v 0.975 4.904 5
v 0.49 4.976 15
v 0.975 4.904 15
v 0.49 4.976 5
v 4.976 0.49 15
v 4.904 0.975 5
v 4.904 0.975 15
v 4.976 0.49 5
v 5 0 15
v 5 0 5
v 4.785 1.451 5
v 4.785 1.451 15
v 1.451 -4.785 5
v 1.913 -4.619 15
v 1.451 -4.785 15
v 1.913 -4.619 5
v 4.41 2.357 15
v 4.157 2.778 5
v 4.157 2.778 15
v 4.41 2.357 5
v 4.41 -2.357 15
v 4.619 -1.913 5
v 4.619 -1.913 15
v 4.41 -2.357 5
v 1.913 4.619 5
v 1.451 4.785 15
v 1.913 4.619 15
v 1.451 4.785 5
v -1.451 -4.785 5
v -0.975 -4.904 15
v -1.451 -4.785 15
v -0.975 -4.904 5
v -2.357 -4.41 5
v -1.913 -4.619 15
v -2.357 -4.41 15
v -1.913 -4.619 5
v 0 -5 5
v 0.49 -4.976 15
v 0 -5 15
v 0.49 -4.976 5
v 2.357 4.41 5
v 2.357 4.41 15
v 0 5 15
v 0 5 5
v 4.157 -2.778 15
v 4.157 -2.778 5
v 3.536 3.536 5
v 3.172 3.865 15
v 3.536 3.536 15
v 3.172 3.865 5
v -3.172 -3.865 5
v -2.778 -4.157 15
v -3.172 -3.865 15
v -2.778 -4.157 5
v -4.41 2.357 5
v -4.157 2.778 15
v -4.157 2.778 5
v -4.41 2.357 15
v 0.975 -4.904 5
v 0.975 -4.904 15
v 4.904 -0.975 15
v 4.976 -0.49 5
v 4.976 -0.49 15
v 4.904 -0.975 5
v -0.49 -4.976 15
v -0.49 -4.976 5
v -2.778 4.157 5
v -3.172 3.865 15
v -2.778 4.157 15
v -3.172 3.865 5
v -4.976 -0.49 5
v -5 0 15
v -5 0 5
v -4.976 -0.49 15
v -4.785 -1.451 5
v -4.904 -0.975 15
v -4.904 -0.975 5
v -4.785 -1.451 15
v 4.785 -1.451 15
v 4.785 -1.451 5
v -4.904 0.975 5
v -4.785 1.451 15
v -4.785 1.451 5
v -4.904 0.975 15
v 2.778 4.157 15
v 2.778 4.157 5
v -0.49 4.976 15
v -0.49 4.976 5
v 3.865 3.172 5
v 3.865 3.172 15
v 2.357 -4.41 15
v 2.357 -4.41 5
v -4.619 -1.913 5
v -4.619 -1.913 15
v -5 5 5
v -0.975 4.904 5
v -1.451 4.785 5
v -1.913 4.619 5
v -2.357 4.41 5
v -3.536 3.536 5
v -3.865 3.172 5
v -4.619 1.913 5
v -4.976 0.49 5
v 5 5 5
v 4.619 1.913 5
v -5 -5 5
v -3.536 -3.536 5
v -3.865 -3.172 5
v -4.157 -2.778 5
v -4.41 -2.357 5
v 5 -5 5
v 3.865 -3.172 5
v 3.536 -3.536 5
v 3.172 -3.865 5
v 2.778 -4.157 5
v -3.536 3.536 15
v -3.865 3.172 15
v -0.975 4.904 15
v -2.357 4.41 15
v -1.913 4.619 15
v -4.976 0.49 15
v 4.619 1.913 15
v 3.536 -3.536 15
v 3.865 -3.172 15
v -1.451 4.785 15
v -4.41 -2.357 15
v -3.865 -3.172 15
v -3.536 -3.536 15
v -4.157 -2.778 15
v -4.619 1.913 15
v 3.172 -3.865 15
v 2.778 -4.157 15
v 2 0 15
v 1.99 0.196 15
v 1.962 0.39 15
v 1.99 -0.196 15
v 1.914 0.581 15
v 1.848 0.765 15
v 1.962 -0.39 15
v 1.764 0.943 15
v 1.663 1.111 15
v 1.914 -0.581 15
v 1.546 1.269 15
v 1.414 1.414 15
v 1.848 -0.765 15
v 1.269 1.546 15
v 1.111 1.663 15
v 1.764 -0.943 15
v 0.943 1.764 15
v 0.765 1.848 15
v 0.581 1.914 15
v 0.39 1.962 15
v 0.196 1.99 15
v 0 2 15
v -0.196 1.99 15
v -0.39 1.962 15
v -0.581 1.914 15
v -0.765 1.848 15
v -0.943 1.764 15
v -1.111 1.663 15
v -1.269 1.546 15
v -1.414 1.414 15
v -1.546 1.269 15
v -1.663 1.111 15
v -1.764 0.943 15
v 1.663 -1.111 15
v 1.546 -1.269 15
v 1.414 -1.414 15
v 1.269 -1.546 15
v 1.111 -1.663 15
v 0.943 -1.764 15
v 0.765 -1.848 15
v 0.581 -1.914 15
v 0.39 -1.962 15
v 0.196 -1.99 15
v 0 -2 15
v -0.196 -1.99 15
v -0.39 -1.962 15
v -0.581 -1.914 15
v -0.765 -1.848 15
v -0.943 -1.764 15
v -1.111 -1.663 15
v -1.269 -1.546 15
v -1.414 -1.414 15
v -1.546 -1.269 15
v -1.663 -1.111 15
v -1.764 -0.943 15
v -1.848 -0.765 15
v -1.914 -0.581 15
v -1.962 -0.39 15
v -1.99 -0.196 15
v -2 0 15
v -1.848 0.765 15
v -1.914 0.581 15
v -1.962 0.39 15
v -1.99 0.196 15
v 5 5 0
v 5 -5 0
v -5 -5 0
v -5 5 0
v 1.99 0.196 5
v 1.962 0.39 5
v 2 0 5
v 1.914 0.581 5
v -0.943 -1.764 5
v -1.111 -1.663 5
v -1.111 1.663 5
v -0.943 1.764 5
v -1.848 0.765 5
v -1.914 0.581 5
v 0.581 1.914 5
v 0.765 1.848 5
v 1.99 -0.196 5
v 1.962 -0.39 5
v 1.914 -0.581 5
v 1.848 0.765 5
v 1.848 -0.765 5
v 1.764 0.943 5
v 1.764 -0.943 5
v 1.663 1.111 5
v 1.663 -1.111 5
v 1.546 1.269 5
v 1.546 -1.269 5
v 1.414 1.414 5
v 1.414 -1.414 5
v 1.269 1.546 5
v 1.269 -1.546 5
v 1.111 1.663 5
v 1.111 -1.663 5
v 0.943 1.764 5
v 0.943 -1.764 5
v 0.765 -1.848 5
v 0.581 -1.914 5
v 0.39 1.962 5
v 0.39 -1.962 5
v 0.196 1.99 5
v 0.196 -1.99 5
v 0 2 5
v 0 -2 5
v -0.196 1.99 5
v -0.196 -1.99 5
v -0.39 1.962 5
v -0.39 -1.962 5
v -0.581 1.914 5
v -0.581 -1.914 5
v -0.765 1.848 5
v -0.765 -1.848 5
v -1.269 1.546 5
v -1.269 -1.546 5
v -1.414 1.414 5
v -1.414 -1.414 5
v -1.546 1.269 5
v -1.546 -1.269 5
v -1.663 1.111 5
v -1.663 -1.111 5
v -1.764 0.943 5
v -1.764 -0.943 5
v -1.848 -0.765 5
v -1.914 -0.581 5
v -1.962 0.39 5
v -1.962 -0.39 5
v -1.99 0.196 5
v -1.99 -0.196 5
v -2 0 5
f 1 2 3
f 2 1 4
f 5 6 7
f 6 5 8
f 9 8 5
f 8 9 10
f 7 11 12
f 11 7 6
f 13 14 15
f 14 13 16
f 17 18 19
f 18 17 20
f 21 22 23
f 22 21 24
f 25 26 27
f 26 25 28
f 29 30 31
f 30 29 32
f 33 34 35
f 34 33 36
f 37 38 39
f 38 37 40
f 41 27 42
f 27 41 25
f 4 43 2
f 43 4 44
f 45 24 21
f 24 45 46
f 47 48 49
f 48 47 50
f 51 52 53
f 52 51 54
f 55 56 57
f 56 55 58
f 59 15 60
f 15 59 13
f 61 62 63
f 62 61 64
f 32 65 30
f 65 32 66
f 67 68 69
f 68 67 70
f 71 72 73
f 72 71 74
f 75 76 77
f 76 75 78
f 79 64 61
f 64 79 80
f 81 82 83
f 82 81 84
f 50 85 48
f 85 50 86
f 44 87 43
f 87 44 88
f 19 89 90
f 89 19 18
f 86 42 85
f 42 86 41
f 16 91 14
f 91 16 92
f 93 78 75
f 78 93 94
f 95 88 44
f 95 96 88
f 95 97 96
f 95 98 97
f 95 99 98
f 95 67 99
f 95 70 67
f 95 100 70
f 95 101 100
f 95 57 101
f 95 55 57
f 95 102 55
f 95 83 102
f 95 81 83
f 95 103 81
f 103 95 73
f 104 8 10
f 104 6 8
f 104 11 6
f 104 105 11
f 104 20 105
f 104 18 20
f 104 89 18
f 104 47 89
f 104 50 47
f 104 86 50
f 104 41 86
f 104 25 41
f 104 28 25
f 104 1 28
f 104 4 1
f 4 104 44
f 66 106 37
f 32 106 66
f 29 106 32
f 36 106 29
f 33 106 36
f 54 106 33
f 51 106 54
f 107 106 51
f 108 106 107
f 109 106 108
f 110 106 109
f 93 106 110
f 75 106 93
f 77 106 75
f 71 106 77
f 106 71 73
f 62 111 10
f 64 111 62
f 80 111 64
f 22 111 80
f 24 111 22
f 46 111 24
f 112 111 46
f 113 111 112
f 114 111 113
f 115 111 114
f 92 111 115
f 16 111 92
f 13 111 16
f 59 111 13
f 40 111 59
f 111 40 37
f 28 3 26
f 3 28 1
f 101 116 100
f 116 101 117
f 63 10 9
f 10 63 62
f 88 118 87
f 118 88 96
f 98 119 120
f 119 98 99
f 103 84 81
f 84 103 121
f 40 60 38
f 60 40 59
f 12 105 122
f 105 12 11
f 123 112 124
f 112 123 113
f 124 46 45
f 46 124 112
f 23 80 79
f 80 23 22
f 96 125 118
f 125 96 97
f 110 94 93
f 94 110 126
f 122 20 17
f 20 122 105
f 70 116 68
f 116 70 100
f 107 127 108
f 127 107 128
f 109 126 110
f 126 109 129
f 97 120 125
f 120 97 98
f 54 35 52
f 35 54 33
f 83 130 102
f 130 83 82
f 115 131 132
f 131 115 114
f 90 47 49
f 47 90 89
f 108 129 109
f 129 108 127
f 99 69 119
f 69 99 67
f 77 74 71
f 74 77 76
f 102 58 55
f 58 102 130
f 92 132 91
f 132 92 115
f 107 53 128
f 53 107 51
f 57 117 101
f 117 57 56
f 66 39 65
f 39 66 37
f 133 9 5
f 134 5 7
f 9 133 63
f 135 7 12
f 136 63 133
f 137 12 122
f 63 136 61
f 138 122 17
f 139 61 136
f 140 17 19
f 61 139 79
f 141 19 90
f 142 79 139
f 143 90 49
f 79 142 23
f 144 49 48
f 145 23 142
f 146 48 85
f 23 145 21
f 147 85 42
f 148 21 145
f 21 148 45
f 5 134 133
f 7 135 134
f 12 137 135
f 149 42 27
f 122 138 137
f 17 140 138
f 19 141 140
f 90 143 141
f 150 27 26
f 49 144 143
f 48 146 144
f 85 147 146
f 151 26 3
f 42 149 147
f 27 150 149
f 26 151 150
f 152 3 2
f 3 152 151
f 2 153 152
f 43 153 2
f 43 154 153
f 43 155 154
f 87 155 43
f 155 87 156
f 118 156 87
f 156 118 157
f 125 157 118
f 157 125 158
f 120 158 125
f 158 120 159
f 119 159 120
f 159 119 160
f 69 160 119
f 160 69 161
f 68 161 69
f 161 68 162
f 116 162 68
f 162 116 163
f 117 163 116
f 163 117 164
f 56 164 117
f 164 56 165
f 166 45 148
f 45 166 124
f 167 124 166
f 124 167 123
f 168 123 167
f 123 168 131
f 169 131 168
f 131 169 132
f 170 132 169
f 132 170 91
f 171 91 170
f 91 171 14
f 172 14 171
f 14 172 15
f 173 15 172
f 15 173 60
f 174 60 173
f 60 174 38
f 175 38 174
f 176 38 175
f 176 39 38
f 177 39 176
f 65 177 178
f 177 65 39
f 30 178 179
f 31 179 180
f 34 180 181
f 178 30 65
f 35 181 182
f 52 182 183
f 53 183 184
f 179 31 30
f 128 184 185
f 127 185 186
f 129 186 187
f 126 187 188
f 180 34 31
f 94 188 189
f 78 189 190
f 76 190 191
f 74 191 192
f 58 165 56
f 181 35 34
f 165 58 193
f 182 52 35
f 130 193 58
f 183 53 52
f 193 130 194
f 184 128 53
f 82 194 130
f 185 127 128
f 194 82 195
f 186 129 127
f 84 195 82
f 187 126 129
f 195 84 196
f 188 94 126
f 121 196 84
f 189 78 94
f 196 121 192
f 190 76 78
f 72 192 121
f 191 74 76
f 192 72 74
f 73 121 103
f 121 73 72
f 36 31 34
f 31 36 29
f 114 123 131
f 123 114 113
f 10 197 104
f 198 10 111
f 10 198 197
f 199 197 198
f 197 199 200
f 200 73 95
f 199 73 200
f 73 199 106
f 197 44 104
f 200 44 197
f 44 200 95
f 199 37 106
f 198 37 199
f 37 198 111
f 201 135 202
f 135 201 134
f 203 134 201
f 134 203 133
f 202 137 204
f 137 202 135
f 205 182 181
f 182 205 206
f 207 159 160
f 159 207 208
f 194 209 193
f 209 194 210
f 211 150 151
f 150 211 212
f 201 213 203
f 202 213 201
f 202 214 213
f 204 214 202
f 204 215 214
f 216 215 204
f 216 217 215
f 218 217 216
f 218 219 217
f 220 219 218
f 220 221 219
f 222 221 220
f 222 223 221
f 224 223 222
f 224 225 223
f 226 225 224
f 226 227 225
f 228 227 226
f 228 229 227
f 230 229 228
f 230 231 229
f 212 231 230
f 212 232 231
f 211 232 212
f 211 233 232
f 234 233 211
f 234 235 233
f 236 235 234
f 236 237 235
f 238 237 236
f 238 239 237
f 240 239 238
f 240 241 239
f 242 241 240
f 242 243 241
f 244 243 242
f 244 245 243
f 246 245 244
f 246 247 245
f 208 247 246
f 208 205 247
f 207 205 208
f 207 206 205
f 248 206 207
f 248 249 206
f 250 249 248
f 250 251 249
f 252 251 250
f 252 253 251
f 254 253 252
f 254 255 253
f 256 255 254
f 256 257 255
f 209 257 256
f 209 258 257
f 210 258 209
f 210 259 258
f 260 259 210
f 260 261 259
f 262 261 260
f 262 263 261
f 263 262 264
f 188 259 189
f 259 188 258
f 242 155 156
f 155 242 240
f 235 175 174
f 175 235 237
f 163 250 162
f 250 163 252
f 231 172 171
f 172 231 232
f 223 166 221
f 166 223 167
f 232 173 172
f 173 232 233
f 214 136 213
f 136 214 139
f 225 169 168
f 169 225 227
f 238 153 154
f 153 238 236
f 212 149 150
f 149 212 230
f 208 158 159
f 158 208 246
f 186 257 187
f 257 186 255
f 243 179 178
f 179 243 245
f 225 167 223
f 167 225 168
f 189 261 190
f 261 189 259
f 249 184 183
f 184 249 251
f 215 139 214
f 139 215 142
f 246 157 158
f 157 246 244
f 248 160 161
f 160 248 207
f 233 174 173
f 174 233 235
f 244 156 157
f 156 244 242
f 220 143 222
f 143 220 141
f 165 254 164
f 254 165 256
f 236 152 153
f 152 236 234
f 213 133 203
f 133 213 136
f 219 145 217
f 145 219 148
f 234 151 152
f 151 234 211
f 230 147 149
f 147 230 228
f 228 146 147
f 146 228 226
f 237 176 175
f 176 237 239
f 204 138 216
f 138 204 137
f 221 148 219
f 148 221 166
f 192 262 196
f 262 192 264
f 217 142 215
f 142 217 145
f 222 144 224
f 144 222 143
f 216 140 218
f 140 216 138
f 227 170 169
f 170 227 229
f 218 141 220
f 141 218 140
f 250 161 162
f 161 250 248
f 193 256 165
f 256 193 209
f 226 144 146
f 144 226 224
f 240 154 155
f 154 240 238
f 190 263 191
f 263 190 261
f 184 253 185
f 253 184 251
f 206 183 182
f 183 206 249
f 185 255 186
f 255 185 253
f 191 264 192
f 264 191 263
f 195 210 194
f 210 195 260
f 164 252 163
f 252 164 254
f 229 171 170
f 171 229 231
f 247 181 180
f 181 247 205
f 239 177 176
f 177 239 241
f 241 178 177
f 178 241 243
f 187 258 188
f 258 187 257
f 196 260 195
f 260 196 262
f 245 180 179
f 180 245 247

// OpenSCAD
module component() {
    difference() {
        union() {
            translate([0, 0, 5])
                cylinder(h=10, r=5, $fn=64);
            translate([-5, -5, 0])
                cube([10, 10, 5]);
        }
        translate([0, 0, 5])
            cylinder(h=10, r=2, $fn=64);
    }
}

component();
